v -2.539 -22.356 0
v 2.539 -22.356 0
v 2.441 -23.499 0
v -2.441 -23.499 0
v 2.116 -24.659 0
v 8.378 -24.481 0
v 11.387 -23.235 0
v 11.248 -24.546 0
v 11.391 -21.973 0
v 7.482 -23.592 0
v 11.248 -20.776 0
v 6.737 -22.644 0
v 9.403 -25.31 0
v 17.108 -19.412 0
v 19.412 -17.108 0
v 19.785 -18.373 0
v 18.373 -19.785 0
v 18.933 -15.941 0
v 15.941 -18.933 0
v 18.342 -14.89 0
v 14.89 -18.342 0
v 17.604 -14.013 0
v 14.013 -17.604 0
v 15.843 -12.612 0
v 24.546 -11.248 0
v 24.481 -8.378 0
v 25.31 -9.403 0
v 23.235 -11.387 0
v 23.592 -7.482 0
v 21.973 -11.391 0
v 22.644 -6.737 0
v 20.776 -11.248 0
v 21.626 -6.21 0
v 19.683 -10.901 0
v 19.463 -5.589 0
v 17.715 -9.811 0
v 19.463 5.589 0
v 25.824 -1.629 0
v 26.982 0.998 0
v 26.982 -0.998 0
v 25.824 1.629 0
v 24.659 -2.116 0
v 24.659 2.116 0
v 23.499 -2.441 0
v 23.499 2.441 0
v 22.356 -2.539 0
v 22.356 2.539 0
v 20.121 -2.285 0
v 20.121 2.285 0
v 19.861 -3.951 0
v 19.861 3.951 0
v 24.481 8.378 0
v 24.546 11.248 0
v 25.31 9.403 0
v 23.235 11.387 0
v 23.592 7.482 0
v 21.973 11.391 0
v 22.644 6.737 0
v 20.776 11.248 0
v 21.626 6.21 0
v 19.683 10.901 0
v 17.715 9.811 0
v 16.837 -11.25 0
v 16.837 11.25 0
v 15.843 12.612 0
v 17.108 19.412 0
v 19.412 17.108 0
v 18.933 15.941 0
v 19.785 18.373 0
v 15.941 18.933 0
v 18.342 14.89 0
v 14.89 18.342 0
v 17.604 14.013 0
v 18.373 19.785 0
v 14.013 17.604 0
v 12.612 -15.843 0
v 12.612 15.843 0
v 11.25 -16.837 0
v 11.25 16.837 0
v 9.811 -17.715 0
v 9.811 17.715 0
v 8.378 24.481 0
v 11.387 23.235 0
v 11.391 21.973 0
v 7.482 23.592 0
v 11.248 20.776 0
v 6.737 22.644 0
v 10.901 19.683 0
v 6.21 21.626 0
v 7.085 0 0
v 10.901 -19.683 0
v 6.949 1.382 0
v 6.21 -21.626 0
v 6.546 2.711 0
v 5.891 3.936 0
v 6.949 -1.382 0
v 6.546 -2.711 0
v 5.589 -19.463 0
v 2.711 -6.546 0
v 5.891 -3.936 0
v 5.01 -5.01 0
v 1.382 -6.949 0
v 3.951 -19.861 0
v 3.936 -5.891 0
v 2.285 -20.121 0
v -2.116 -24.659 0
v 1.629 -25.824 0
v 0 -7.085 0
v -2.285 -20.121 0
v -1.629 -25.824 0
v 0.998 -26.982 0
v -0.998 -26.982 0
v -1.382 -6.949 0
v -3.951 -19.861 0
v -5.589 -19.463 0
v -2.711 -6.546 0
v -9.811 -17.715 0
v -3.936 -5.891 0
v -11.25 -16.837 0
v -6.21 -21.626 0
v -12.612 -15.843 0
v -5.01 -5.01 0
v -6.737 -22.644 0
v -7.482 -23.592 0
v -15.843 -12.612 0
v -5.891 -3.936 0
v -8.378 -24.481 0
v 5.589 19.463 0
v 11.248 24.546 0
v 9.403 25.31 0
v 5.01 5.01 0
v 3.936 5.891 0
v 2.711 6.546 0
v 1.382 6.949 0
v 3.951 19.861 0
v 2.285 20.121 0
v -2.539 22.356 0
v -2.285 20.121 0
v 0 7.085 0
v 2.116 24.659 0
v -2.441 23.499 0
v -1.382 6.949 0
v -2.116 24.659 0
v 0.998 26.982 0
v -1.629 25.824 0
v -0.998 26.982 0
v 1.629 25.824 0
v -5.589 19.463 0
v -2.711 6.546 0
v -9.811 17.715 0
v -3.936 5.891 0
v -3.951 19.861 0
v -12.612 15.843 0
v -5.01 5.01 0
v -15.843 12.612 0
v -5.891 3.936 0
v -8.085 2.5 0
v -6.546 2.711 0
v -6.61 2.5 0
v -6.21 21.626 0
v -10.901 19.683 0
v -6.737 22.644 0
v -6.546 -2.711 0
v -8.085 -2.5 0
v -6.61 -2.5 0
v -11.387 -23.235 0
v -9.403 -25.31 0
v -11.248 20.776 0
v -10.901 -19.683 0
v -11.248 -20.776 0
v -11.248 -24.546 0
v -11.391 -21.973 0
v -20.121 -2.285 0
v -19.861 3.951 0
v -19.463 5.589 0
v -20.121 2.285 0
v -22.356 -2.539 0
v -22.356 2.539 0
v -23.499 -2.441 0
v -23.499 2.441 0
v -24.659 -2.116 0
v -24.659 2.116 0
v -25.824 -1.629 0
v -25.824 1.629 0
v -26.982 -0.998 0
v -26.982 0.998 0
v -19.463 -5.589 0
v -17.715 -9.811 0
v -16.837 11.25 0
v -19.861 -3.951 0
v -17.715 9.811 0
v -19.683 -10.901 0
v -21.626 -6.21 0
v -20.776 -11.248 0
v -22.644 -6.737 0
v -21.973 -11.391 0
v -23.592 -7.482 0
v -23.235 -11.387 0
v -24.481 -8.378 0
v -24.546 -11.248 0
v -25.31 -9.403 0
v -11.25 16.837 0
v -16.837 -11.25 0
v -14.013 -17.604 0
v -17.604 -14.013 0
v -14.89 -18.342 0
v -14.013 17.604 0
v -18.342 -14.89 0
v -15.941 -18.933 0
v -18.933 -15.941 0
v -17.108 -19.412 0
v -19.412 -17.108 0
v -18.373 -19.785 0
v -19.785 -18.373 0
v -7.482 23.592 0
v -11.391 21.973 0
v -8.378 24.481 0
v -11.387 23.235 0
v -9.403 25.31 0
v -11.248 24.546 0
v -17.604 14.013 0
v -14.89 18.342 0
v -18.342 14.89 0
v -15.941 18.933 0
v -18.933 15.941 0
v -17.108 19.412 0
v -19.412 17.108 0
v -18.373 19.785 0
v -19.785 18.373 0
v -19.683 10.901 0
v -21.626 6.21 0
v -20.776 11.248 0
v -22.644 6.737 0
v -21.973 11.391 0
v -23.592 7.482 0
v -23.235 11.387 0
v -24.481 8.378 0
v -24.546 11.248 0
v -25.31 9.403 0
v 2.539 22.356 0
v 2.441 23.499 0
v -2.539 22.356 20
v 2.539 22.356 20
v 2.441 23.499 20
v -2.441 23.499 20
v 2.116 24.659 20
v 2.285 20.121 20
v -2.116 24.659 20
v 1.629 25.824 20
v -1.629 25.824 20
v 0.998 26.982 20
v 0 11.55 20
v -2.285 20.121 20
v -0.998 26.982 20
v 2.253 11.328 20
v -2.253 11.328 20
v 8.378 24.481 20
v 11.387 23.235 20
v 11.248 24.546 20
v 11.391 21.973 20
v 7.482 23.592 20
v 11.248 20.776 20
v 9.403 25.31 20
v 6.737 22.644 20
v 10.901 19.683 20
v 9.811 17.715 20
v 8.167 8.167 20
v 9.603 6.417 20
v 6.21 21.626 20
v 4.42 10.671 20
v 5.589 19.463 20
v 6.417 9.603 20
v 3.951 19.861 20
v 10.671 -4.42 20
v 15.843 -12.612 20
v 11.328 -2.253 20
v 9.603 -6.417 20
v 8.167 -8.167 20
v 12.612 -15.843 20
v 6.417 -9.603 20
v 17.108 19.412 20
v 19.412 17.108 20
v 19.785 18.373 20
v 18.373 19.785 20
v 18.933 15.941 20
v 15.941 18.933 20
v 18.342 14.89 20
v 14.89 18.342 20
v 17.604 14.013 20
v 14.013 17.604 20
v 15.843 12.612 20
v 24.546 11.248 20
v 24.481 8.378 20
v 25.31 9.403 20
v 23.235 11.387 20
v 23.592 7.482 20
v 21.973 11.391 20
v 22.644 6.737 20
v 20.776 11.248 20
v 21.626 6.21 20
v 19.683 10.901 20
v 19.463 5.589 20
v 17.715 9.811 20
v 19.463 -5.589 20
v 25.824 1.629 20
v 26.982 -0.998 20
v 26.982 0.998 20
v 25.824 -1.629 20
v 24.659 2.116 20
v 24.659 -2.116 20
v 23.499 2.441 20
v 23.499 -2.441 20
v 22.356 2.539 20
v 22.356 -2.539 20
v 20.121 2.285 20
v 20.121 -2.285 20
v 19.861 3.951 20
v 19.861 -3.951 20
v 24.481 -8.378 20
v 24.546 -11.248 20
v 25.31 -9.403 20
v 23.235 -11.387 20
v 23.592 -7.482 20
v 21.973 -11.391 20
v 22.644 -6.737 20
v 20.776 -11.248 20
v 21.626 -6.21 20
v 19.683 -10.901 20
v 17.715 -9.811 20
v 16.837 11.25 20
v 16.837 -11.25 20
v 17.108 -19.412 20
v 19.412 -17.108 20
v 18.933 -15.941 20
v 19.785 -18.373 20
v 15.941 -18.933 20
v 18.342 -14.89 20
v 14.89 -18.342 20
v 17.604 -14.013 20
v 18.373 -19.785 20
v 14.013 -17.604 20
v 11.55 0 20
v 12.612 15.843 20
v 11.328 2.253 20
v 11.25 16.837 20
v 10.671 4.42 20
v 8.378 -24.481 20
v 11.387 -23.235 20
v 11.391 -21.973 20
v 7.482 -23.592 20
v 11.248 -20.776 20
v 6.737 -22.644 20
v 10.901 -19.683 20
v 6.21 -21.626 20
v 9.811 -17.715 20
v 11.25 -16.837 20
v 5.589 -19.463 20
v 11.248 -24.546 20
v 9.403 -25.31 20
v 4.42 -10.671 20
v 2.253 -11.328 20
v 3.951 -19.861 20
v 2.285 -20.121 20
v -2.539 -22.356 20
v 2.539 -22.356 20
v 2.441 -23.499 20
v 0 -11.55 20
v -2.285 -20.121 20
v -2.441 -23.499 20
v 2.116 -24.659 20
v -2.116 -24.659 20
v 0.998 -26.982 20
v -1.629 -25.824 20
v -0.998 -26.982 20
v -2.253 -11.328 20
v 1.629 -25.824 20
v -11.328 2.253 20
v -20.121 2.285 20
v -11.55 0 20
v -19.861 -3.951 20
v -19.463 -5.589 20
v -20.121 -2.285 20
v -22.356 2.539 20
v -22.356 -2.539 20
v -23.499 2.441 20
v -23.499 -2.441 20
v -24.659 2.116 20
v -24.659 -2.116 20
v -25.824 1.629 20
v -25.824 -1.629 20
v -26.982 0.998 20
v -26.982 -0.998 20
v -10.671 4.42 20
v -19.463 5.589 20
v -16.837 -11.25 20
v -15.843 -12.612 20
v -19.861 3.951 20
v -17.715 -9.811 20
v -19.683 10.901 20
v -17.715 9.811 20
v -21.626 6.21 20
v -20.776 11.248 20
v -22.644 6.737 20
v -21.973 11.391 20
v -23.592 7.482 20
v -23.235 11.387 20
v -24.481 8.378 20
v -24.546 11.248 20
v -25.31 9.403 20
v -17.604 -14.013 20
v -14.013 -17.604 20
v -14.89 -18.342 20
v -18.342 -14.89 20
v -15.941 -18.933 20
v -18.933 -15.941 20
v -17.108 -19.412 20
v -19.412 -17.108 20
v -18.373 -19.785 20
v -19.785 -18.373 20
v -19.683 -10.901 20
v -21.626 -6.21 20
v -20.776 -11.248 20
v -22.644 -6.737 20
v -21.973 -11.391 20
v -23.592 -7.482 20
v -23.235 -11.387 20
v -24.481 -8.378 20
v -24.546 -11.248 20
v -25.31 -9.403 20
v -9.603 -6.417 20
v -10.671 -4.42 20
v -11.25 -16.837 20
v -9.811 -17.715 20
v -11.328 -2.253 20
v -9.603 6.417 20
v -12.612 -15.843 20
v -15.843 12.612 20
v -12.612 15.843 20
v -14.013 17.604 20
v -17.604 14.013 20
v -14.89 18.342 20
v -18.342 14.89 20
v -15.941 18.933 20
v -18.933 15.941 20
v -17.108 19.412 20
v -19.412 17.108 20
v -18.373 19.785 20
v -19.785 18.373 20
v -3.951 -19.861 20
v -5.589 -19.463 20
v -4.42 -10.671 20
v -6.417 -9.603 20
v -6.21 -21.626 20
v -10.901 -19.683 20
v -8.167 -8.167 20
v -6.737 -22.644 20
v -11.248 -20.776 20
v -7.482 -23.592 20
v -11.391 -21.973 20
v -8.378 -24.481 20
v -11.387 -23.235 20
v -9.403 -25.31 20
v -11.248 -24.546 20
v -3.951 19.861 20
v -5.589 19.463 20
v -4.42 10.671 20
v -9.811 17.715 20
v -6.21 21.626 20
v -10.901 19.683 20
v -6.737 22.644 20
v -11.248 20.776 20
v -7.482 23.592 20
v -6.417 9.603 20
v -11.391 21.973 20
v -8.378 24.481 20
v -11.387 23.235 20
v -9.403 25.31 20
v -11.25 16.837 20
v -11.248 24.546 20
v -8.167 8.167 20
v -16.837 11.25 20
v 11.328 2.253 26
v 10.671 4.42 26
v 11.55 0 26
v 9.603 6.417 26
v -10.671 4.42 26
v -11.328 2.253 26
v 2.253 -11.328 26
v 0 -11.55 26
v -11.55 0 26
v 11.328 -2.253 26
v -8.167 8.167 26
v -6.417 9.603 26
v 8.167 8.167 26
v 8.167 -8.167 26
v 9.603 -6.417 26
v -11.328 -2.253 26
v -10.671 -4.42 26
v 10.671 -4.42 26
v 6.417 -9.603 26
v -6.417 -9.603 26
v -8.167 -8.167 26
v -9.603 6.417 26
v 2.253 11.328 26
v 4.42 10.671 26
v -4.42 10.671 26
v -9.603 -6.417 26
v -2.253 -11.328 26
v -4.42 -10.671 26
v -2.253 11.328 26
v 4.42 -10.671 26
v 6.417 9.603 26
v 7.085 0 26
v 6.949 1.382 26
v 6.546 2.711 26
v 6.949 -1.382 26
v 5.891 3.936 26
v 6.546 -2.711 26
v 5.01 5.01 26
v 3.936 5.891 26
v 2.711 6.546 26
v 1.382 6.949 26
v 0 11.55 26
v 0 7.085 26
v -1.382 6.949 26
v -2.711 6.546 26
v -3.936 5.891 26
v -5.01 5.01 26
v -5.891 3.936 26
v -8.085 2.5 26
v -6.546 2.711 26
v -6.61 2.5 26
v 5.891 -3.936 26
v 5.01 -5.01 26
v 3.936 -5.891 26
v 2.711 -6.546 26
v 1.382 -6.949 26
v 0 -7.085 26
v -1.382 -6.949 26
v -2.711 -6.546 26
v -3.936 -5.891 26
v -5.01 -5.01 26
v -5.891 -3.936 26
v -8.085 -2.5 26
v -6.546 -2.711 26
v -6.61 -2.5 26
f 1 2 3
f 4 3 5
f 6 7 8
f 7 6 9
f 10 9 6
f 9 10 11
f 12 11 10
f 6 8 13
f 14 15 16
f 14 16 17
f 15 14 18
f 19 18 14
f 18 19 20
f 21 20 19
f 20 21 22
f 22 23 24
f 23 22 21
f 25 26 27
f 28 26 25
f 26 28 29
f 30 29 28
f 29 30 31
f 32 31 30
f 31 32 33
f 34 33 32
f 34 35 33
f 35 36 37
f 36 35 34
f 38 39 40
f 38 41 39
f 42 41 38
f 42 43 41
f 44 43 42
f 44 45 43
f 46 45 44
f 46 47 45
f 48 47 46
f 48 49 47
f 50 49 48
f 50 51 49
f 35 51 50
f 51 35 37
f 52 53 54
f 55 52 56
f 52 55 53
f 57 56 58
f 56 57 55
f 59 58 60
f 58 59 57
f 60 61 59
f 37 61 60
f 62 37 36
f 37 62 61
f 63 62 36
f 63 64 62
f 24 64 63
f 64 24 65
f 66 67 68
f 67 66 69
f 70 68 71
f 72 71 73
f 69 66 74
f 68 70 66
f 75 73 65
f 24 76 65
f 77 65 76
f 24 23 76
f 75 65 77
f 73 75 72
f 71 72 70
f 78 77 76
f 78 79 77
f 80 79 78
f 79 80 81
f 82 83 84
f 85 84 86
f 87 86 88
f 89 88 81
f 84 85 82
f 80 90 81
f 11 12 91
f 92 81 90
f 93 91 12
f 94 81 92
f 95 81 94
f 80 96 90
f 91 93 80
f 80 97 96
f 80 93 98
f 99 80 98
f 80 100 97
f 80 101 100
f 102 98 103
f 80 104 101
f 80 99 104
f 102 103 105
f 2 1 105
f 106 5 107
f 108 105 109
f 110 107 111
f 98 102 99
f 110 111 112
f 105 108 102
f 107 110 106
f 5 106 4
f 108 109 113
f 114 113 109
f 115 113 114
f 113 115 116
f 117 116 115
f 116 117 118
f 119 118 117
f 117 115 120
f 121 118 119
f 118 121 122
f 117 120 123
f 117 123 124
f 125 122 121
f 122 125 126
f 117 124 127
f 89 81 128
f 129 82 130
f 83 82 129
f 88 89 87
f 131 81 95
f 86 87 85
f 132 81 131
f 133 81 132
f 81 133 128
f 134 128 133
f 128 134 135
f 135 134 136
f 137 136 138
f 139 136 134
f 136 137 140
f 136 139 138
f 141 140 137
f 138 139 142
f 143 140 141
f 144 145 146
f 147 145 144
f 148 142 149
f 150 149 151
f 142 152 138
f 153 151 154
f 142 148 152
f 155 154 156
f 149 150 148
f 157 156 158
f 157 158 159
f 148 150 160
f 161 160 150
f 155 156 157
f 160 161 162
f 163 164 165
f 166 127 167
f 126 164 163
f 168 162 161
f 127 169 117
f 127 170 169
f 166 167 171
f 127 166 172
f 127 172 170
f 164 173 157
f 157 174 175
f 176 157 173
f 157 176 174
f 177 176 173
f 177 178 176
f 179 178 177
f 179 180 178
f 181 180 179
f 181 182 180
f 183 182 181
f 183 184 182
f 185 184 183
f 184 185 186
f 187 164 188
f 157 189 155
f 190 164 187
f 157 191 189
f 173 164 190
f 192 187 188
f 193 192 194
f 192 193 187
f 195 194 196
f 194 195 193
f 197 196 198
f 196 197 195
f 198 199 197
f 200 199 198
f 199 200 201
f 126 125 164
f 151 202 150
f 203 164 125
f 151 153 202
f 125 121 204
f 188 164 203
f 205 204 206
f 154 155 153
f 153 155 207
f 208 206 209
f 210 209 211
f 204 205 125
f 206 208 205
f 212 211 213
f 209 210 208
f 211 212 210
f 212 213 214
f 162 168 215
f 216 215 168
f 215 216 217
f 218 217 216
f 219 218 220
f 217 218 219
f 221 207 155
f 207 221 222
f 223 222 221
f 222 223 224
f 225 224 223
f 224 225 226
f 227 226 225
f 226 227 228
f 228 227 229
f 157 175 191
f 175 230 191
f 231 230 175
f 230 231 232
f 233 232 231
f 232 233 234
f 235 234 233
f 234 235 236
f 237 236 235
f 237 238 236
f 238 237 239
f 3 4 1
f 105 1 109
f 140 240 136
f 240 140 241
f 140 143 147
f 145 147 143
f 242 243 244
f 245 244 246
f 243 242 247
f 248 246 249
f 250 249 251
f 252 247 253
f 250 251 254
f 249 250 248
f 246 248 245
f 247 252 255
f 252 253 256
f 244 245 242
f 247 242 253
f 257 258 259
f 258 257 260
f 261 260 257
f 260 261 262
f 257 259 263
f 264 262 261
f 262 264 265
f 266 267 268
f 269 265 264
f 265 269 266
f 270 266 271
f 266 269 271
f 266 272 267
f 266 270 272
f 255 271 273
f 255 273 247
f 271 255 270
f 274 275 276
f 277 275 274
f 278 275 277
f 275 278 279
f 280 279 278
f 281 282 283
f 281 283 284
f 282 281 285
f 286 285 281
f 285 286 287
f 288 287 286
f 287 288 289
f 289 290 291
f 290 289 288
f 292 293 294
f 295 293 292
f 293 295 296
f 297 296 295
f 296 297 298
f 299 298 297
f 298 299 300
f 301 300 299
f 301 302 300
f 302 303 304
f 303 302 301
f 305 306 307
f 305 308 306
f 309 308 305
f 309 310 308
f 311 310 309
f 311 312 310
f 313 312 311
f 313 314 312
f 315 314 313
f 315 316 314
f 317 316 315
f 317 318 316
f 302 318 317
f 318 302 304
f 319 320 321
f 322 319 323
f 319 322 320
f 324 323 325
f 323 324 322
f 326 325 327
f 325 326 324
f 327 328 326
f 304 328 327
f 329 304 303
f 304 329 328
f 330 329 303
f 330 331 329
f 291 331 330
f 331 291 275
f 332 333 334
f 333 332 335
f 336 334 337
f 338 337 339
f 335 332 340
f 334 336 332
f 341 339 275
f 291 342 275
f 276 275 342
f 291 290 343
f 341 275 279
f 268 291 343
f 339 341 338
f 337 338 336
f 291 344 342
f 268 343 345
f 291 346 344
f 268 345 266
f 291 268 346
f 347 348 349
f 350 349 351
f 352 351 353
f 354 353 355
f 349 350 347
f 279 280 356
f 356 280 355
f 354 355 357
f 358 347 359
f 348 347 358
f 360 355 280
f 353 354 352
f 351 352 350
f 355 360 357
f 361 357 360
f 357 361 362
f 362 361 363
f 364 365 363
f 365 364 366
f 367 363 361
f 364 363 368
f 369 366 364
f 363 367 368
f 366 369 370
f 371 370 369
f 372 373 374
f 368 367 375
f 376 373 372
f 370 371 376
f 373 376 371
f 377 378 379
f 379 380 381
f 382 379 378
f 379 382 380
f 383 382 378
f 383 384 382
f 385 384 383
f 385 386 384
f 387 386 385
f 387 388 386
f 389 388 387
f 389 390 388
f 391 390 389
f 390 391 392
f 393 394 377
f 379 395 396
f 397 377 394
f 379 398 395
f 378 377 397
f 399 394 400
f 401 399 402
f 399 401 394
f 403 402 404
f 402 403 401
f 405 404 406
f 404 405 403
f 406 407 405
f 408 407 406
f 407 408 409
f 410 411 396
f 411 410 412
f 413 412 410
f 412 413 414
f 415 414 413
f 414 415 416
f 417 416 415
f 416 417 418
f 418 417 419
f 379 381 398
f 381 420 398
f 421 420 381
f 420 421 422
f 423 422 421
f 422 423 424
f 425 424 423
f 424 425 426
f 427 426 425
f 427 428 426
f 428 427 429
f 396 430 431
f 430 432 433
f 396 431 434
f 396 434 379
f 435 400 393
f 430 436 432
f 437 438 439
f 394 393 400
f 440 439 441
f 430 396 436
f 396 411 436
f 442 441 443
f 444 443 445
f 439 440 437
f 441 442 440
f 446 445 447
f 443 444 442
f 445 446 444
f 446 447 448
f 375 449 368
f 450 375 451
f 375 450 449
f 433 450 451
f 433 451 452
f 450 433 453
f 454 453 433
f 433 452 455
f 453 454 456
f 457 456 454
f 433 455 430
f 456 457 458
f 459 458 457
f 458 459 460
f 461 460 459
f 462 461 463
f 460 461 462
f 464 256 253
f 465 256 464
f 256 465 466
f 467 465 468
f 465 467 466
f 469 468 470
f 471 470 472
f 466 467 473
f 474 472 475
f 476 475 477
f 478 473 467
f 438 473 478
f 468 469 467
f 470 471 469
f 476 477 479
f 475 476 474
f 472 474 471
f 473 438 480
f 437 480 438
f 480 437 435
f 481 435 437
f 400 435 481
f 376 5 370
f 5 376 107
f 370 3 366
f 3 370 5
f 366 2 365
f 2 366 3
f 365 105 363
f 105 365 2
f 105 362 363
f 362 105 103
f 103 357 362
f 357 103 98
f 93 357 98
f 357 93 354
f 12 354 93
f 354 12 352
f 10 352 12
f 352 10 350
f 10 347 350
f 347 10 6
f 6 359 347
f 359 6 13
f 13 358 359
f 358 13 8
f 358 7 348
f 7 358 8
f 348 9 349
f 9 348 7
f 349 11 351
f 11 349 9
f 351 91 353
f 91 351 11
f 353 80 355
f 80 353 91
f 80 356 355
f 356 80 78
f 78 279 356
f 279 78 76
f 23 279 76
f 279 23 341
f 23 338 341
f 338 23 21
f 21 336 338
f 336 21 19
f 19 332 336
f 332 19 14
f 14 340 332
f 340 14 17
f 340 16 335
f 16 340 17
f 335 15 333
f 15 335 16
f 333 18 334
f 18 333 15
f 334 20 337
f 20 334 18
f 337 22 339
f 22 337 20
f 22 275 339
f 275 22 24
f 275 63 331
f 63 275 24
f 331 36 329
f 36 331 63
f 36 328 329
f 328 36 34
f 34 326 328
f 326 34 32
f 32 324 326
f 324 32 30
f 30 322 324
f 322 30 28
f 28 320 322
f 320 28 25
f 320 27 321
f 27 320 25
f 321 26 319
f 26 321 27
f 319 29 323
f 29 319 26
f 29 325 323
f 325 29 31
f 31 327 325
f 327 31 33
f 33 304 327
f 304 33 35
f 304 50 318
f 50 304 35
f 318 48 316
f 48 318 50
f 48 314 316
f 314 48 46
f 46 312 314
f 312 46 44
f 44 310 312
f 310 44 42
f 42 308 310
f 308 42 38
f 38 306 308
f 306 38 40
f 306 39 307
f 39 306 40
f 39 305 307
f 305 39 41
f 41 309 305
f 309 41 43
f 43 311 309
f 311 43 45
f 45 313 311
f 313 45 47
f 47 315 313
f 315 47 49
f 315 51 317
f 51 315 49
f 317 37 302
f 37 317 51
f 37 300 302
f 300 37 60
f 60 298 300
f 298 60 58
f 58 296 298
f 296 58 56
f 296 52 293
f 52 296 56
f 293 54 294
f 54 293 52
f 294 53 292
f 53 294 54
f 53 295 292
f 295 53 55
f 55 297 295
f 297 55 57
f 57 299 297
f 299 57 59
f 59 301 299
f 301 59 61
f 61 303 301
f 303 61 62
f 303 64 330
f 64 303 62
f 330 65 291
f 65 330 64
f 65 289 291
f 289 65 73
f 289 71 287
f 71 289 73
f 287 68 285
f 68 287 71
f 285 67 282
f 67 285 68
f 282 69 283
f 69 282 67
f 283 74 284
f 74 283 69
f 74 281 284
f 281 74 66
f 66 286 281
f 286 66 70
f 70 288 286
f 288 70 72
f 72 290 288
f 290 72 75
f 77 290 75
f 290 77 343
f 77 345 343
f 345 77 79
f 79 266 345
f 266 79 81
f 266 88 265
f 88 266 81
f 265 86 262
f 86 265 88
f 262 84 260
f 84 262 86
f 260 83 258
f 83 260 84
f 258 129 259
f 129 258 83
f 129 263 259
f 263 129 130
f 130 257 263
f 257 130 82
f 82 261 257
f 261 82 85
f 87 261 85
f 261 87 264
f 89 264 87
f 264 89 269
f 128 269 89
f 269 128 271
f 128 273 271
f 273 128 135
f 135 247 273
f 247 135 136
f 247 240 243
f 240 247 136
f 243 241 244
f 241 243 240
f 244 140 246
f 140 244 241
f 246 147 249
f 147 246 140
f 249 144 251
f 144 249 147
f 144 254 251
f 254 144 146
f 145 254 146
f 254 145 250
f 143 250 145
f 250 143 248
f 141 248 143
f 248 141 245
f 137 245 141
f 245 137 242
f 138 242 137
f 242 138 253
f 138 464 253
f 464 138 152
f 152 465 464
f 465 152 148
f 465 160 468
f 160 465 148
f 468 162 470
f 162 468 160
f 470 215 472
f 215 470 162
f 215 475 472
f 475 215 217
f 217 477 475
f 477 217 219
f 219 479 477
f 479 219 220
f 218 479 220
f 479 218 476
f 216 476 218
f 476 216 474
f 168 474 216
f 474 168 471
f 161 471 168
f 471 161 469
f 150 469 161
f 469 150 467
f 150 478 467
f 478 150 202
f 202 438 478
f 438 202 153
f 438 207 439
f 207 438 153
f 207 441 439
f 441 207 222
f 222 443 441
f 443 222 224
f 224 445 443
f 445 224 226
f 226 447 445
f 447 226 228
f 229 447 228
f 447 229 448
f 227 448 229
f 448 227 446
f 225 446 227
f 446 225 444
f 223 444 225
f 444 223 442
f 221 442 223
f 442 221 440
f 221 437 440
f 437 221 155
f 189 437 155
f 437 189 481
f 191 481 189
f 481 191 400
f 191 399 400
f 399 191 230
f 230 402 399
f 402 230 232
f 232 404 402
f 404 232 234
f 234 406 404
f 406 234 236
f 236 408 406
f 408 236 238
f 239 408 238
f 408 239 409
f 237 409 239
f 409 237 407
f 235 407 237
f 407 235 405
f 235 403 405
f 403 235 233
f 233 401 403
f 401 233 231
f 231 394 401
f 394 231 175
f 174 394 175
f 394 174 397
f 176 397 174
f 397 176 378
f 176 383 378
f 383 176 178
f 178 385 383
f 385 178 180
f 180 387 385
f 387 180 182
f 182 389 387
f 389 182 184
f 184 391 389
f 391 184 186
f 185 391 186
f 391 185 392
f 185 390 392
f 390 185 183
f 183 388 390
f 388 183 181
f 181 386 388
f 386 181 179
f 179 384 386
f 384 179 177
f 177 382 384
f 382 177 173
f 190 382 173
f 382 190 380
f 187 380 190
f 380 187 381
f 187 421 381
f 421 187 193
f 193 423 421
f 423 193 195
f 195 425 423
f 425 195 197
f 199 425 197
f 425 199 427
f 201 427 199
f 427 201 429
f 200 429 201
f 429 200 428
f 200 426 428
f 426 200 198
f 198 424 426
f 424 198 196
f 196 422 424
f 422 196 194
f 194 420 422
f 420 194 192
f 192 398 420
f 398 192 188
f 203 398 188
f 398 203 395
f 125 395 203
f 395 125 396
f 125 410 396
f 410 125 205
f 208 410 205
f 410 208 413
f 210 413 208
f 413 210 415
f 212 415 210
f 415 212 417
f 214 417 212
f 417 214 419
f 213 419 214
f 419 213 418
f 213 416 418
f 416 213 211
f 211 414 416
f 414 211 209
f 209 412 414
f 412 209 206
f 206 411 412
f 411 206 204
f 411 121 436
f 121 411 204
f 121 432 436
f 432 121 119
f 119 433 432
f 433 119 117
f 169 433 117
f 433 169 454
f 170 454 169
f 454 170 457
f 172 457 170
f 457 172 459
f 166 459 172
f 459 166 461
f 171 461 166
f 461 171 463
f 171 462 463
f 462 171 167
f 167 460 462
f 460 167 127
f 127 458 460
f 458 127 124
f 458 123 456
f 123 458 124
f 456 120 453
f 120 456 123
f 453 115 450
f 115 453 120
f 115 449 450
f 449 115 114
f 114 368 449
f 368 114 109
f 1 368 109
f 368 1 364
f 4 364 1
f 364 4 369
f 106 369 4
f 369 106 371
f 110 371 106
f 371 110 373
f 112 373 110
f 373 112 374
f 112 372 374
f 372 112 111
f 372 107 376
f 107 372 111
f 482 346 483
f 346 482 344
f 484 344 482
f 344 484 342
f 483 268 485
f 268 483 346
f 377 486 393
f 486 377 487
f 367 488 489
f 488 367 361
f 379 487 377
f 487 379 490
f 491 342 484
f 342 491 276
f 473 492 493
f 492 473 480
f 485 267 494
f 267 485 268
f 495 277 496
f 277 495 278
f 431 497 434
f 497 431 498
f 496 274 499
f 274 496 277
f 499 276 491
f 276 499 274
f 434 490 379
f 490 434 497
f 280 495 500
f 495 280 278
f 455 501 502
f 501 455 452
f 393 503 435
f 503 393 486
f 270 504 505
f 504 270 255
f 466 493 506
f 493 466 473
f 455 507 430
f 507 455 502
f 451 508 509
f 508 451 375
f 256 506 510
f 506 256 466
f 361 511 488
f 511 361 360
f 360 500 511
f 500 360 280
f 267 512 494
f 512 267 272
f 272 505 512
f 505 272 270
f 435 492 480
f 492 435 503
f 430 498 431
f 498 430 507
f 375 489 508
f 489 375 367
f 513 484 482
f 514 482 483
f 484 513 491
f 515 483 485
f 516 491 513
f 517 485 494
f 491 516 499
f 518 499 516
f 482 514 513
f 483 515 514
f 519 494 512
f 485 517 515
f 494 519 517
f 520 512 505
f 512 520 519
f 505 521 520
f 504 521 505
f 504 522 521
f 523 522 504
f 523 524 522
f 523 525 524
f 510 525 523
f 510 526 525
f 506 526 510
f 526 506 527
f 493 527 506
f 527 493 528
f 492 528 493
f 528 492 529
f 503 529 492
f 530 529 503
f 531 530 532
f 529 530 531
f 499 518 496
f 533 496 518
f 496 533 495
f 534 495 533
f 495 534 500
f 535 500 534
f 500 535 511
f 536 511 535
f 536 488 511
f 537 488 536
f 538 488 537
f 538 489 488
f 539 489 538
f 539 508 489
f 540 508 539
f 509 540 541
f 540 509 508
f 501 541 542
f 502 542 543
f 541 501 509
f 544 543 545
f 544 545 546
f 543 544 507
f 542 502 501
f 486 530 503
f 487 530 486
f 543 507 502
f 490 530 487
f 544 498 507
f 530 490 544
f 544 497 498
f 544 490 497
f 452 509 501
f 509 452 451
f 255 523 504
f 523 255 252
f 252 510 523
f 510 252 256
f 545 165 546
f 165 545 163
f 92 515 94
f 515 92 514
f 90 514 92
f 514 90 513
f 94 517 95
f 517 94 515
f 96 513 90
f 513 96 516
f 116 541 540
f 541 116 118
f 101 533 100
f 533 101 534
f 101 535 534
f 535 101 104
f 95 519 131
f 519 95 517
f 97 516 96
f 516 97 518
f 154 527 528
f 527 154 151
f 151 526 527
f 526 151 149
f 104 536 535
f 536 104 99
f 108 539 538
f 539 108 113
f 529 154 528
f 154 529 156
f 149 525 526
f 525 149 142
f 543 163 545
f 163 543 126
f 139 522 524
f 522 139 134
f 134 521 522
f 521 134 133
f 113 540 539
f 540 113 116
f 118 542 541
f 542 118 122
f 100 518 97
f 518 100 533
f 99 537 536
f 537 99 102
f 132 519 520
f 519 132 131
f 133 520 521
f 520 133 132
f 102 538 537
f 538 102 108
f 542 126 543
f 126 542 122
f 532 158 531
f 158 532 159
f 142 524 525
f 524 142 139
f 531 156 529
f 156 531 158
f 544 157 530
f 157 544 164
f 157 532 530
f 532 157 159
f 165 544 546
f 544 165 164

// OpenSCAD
$fn = 32;

// ----------------------------------------------------------------------
// Spur gear: m=3 z=16, 54 mm tip diameter x 26 mm
// ----------------------------------------------------------------------

// --- parameters (mm) ---
gear_module = 3;          // module
tooth_count = 16;         // number of teeth
gear_w = 20;              // face width
pa = 20;                  // pressure angle, deg
bore = 14.17;             // shaft bore
hub_dia = 23.1;           // hub diameter
hub_len = 6;              // hub above the face
key_w = 5;                // keyway width
key_h = 2.3;              // keyway depth

/* --- involute profile --- */
pitch_r = gear_module * tooth_count / 2;
base_r = pitch_r * cos(pa);
tip_r = pitch_r + gear_module;
root_r = pitch_r - 1.25 * gear_module;
flank_steps = 6;

function inv_deg(a) = (tan(a) - a * PI / 180) * 180 / PI;
function flank_r(i) = root_r + (tip_r - root_r) * i / flank_steps;
function half_angle(r) = 90 / tooth_count + inv_deg(pa) - inv_deg(acos(min(1, base_r / r)));
function tooth_pt(k, i, side) =
    let (r = flank_r(i), a = k * 360 / tooth_count + side * half_angle(r))
    [r * cos(a), r * sin(a)];

module tooth_profile() {
  polygon(points = [
    for (k = [0 : tooth_count - 1])
      each [
        for (i = [0 : flank_steps]) tooth_pt(k, i, -1),
        for (i = [flank_steps : -1 : 0]) tooth_pt(k, i, 1),
        let (ta = (k + 0.5) * 360 / tooth_count)
          [root_r * cos(ta), root_r * sin(ta)]
      ]
  ]);
}

module gear_disc() {
  linear_extrude(height = gear_w) tooth_profile();
}

module hub_boss() {
  translate([0, 0, gear_w - 1]) cylinder(h = hub_len + 1, d = hub_dia);
}

difference() {
  union() {
    gear_disc();
    hub_boss();
  }
  translate([0, 0, -1]) cylinder(h = gear_w + hub_len + 3, d = bore);
  /* keyway on the bore */
  translate([-bore / 2 - 1, -key_w / 2, -1]) cube([key_h + 1, key_w, gear_w + hub_len + 3]);
}
